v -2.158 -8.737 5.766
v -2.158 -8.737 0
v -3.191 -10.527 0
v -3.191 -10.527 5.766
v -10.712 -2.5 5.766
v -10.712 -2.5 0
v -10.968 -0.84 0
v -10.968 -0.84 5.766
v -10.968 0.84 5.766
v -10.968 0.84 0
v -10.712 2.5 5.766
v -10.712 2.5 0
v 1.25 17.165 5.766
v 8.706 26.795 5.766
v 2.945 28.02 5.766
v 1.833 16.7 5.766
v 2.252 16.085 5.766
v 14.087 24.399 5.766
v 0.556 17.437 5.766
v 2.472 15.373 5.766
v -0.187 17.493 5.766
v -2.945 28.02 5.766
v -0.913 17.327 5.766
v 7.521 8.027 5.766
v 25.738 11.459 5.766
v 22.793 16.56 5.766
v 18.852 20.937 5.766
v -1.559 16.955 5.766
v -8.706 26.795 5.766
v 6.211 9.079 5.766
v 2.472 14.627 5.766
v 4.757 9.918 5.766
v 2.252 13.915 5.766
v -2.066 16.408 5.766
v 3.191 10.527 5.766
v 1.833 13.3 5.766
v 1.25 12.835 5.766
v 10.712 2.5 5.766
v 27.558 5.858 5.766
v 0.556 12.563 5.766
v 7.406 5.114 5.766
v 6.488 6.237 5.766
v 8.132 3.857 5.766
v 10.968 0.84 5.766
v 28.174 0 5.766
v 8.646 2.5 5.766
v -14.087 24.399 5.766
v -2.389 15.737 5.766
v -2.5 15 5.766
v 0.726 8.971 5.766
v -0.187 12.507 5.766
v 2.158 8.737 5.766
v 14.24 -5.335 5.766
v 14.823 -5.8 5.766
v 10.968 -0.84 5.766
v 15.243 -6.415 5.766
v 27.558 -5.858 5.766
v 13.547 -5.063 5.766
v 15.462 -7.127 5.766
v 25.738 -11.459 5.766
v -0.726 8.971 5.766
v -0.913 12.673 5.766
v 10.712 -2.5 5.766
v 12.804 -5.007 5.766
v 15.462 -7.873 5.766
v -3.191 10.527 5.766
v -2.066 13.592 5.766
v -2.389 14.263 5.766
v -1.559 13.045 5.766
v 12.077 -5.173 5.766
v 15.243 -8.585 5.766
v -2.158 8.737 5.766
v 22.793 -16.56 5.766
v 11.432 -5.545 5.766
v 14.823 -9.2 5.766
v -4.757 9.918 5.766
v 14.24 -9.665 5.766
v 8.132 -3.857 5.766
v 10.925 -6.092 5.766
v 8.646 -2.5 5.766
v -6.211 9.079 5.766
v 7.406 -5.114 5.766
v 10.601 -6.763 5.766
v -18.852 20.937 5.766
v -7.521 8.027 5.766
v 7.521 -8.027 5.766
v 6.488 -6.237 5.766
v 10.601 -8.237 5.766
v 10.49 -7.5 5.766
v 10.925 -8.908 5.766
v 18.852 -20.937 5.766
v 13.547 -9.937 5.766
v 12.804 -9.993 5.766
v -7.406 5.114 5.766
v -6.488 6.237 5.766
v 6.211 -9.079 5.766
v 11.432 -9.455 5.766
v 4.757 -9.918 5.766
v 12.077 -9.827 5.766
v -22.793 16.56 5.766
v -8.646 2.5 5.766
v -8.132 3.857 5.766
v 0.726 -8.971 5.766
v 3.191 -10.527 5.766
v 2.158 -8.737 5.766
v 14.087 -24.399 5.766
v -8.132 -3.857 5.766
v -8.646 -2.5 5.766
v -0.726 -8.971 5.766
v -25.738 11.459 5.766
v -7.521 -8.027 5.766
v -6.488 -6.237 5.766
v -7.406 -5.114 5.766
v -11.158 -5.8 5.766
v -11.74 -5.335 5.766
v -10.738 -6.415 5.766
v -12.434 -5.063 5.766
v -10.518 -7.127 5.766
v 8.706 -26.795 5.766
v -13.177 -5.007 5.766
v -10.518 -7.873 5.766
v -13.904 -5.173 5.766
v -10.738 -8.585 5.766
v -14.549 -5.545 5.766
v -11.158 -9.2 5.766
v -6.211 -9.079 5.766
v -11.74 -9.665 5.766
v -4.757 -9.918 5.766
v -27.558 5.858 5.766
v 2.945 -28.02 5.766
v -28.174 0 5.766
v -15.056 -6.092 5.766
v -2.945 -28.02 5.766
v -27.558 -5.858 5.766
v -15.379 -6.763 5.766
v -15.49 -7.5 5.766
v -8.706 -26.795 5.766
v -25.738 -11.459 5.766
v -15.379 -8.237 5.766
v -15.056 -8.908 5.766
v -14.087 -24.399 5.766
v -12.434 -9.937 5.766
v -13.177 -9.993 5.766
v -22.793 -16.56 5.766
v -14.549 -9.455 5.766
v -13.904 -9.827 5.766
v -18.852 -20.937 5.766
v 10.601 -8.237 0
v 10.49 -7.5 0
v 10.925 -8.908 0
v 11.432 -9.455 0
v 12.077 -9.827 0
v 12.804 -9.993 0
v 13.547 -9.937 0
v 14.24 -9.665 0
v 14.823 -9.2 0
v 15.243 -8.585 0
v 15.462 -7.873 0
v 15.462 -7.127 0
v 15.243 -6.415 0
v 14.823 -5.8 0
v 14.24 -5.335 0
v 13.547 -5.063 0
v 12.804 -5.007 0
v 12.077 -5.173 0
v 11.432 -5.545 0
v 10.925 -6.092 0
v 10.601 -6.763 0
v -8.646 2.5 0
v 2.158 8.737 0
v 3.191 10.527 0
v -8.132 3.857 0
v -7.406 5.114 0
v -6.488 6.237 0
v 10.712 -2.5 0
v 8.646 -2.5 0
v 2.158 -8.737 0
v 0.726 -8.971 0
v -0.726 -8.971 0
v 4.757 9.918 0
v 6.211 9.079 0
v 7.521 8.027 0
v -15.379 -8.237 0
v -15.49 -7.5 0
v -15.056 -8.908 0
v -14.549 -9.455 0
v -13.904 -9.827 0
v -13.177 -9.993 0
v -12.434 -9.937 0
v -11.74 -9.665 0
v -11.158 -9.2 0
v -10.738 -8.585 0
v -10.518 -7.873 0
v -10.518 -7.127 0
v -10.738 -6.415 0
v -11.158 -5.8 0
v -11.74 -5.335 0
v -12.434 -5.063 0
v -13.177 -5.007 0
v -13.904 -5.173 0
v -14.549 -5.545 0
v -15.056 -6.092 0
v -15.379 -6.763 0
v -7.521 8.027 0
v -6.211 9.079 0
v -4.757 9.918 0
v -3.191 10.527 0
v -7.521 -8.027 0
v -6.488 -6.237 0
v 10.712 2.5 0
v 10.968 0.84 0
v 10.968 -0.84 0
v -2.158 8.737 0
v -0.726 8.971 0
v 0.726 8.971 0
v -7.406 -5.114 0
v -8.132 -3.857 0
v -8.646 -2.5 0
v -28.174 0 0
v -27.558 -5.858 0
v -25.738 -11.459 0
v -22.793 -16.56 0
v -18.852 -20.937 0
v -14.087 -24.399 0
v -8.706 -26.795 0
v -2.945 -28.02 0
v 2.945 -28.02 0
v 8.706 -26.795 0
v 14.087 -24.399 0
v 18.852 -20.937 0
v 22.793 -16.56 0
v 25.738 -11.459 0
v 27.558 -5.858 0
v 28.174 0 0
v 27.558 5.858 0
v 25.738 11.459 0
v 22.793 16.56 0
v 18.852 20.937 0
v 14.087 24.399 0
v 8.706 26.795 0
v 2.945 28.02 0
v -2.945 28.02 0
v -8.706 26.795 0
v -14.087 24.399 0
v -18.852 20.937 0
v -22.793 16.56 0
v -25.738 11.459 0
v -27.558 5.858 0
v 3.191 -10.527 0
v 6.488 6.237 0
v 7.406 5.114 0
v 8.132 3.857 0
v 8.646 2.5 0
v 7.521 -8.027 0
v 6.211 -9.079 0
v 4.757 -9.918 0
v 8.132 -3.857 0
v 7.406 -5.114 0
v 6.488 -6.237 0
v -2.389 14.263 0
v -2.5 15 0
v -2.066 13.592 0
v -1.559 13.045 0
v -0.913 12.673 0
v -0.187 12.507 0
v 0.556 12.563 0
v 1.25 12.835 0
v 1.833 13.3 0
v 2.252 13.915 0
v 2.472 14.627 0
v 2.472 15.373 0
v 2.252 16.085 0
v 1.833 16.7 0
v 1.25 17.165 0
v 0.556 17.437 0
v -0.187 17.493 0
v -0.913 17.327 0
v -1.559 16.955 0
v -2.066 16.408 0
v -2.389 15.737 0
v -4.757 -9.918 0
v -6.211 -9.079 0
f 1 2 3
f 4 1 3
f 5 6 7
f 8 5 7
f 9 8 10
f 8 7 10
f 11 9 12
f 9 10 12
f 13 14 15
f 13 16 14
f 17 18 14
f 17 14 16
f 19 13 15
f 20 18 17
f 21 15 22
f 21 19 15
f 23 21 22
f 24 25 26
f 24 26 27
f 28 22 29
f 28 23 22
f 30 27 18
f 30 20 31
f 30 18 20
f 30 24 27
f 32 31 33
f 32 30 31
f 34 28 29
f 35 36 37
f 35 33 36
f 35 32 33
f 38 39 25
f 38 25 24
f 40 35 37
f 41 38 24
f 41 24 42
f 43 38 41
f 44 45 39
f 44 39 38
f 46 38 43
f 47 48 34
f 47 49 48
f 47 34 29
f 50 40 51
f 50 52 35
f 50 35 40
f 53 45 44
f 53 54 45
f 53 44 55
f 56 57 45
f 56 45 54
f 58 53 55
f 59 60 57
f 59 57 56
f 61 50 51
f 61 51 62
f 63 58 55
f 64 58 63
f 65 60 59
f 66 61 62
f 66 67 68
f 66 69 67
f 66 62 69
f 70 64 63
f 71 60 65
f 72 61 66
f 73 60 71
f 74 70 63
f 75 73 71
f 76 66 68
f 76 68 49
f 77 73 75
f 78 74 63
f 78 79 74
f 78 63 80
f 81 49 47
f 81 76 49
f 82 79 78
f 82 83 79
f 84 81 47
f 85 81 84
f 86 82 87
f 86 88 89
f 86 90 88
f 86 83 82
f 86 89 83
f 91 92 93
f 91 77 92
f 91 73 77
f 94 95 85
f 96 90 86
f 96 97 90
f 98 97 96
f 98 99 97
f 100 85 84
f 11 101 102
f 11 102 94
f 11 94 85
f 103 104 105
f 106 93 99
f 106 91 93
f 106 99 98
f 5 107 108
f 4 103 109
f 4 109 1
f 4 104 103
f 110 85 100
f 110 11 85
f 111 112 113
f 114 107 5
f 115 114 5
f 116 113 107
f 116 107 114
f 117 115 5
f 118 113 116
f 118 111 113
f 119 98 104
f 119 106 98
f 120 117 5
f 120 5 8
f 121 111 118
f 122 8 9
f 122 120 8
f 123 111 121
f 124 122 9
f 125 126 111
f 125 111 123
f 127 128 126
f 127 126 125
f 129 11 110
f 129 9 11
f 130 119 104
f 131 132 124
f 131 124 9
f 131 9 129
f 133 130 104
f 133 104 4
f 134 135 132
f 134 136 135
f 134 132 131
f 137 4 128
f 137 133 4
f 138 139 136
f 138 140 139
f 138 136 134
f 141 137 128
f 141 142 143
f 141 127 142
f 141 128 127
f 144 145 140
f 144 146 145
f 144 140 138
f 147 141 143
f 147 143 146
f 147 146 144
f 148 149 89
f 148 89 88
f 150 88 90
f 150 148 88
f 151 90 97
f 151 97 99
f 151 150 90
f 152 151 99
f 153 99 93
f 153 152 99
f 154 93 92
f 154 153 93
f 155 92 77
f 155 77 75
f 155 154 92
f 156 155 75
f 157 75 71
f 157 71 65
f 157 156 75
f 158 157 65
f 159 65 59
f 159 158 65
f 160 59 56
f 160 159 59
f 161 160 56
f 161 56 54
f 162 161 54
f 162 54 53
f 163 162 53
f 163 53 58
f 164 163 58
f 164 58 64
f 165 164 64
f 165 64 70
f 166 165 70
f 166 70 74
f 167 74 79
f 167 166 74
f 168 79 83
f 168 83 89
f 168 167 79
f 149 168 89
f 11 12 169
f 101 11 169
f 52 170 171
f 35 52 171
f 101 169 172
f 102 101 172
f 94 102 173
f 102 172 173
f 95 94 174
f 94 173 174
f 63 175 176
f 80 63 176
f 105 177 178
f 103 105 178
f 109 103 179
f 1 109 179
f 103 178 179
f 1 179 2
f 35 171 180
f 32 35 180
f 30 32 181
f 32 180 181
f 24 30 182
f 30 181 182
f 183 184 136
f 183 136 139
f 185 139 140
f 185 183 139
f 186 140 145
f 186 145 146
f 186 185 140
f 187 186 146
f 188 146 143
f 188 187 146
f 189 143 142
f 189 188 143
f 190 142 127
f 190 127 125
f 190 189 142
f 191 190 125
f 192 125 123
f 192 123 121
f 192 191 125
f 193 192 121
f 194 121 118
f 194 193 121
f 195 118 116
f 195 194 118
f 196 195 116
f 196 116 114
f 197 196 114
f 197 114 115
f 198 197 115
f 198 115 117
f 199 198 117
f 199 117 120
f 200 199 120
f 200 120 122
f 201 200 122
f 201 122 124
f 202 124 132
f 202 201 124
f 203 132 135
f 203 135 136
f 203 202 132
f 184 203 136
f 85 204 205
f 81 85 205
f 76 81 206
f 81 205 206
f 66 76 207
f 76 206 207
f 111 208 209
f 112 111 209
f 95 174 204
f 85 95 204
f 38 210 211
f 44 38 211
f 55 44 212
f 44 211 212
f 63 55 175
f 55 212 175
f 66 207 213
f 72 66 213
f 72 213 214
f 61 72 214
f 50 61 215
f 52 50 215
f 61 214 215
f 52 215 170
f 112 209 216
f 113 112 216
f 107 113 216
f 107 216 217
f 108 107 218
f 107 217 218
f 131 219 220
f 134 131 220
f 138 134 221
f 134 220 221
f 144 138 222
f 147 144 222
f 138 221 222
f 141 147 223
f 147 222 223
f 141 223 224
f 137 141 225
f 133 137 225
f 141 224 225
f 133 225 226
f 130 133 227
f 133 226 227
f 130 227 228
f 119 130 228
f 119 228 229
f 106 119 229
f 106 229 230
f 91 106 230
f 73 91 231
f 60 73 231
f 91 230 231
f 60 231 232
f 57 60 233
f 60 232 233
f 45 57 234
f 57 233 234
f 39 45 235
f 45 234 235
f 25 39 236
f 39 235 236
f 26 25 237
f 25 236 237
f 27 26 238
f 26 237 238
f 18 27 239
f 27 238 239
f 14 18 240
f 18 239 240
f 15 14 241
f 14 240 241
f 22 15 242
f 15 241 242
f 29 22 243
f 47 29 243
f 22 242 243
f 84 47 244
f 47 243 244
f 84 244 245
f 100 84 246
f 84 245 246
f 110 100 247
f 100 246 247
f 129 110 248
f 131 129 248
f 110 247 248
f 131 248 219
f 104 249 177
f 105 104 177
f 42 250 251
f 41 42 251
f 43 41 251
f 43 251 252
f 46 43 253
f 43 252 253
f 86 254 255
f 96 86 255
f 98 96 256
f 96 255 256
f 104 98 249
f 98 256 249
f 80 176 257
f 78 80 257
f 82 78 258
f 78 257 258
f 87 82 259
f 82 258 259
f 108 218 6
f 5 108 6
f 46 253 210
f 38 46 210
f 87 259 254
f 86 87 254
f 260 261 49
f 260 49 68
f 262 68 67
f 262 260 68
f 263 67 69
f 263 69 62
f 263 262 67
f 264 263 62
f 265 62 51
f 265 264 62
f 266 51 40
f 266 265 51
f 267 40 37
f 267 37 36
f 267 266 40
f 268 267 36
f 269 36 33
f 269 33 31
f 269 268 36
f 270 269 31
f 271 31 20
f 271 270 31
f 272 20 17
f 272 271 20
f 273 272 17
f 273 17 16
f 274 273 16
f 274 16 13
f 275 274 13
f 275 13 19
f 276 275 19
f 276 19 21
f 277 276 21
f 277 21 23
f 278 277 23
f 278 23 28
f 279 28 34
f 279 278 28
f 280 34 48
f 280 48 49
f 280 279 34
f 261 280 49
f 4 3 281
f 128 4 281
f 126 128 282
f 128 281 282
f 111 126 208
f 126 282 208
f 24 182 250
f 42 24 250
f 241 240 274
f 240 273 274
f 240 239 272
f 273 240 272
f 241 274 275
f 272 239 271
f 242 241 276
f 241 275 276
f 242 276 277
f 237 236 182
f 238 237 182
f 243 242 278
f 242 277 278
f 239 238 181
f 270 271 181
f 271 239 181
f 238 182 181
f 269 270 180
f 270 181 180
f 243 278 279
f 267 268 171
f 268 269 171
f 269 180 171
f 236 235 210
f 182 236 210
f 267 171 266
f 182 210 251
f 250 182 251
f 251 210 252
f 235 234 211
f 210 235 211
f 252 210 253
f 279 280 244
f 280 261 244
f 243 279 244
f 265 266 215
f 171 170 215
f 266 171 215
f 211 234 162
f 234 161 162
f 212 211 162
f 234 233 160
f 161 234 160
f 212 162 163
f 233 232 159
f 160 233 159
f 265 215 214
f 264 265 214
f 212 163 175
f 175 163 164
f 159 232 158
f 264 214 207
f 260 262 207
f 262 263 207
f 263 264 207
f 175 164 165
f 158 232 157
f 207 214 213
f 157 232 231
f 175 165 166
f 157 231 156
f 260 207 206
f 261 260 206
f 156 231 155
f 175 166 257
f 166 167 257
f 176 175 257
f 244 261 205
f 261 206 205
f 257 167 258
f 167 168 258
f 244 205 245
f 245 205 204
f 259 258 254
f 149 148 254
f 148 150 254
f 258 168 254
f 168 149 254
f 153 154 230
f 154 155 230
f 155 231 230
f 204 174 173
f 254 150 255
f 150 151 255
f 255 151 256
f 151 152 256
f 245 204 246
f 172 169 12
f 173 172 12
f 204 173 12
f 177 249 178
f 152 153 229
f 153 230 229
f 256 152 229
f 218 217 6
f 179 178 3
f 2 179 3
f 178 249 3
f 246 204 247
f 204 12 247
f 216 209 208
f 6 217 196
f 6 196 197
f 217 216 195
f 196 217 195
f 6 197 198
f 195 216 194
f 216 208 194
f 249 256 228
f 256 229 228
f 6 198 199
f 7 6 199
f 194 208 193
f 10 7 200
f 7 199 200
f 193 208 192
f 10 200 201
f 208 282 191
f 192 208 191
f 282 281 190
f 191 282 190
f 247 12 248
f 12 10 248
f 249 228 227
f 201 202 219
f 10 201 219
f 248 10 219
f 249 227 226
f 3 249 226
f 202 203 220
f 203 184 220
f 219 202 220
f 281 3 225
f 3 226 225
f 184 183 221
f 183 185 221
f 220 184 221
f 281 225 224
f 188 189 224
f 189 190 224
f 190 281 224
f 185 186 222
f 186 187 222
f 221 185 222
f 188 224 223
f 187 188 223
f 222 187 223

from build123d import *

# Parameters (mm, degrees)
SKETCH1_R           = 28.173882667
SKETCH1_R_2         = 2.5
BOSS_EXTRUDE1_DEPTH = 5.7658


with BuildPart() as part:
    # Sketch1 → Boss-Extrude1 (new body)
    with BuildSketch(Plane.XY):
        with Locations(Location((0, 0, 0), (0, 0, 180))):
            Circle(SKETCH1_R)
        with Locations(Location((0, 15, 0), (0, 0, 180))):
            Circle(SKETCH1_R_2, mode=Mode.SUBTRACT)
        with Locations(Location((12.990381057, -7.5, 0), (0, 0, 180))):
            Circle(SKETCH1_R_2, mode=Mode.SUBTRACT)
        with Locations(Location((-12.990381057, -7.5, 0), (0, 0, 180))):
            Circle(SKETCH1_R_2, mode=Mode.SUBTRACT)
        with BuildLine():
            Line((-10.712142643, 2.5), (-8.645808233, 2.5))
            ThreePointArc((-8.645808233, 2.5), (-7.794228634, 4.5), (-6.487967626, 6.237489566))
            Line((-6.487967626, 6.237489566), (-7.521134831, 8.026987658))
            ThreePointArc((-7.521134831, 8.026987658), (-5.5, 9.526279442), (-3.191007812, 10.526987658))
            Line((-3.191007812, 10.526987658), (-2.157840607, 8.737489566))
            ThreePointArc((-2.157840607, 8.737489566), (0, 9), (2.157840607, 8.737489566))
            Line((2.157840607, 8.737489566), (3.191007812, 10.526987658))
            ThreePointArc((3.191007812, 10.526987658), (5.5, 9.526279442), (7.521134831, 8.026987658))
            Line((7.521134831, 8.026987658), (6.487967626, 6.237489566))
            ThreePointArc((6.487967626, 6.237489566), (7.794228634, 4.5), (8.645808233, 2.5))
            Line((8.645808233, 2.5), (10.712142643, 2.5))
            ThreePointArc((10.712142643, 2.5), (11, 0), (10.712142643, -2.5))
            Line((10.712142643, -2.5), (8.645808233, -2.5))
            ThreePointArc((8.645808233, -2.5), (7.794228634, -4.5), (6.487967626, -6.237489566))
            Line((6.487967626, -6.237489566), (7.521134831, -8.026987658))
            ThreePointArc((7.521134831, -8.026987658), (5.5, -9.526279442), (3.191007812, -10.526987658))
            Line((3.191007812, -10.526987658), (2.157840607, -8.737489566))
            ThreePointArc((2.157840607, -8.737489566), (0, -9), (-2.157840607, -8.737489566))
            Line((-2.157840607, -8.737489566), (-3.191007812, -10.526987658))
            ThreePointArc((-3.191007812, -10.526987658), (-5.5, -9.526279442), (-7.521134831, -8.026987658))
            Line((-7.521134831, -8.026987658), (-6.487967626, -6.237489566))
            ThreePointArc((-6.487967626, -6.237489566), (-7.794228634, -4.5), (-8.645808233, -2.5))
            Line((-8.645808233, -2.5), (-10.712142643, -2.5))
            ThreePointArc((-10.712142643, -2.5), (-11, 0), (-10.712142643, 2.5))
        make_face(mode=Mode.SUBTRACT)
    extrude(amount=BOSS_EXTRUDE1_DEPTH)


solid = part.part
